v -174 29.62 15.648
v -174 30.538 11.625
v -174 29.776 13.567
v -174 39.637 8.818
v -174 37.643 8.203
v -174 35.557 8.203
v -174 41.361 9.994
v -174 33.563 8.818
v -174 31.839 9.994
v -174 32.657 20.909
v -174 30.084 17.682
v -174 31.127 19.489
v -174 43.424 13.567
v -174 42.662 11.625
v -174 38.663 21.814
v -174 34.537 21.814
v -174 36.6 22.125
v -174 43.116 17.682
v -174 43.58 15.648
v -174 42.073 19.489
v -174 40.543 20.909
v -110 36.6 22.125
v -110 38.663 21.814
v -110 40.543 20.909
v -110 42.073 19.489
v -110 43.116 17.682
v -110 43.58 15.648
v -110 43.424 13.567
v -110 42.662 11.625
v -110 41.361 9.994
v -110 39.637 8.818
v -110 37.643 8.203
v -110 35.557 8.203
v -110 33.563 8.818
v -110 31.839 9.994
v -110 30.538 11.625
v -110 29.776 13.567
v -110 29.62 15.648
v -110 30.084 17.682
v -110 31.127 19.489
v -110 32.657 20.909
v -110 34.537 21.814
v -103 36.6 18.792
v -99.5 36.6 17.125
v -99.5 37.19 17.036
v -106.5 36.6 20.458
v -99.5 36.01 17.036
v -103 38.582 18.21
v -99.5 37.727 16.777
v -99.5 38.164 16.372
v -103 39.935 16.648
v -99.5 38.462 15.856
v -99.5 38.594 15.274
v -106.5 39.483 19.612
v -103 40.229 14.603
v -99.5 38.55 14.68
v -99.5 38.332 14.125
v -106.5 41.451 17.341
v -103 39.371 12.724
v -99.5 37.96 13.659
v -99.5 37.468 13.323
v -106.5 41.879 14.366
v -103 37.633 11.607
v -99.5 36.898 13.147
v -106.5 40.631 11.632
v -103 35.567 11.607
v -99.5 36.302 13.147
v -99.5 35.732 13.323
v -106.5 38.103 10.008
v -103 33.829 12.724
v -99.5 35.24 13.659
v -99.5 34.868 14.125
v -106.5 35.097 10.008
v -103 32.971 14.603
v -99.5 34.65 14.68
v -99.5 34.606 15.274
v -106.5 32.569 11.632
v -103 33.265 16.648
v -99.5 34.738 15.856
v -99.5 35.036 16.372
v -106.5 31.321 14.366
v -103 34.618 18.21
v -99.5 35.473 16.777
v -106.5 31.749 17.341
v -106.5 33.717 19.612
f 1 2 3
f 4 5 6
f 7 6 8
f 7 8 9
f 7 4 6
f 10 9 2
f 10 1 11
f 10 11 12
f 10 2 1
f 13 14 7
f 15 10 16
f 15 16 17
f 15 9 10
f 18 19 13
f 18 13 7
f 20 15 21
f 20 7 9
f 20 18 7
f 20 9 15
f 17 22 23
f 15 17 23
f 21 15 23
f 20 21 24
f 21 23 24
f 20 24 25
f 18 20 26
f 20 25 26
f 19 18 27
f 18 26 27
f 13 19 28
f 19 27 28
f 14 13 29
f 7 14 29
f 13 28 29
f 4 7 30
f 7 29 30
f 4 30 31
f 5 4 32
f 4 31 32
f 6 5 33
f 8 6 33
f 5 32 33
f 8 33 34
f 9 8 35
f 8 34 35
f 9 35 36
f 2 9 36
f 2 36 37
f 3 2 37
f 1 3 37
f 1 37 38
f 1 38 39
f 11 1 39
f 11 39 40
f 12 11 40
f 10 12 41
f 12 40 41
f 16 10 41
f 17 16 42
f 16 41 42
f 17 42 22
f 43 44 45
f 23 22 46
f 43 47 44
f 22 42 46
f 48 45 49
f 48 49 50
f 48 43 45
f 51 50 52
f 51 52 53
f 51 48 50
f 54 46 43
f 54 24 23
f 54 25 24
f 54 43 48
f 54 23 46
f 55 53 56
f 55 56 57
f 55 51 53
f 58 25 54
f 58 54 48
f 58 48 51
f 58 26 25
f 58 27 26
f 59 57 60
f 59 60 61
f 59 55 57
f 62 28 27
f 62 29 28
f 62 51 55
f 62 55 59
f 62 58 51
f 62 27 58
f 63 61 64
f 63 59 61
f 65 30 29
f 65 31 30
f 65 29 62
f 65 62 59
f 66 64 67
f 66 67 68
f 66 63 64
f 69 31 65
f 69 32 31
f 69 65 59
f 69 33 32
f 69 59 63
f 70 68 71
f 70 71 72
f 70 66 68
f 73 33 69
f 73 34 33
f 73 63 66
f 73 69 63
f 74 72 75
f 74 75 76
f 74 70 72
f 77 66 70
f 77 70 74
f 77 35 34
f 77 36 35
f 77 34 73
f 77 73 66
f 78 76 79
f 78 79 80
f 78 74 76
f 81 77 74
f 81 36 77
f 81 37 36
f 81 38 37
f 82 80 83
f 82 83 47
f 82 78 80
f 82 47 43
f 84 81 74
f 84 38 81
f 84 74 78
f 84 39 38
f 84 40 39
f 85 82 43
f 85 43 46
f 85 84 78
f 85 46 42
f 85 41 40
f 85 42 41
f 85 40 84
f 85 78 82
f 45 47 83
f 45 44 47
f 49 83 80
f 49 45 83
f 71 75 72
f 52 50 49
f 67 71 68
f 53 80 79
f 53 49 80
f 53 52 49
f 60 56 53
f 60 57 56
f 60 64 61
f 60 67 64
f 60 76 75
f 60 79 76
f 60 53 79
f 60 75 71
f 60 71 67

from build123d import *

# Parameters (mm, degrees)
CYLINDER022_R     = 7
CYLINDER022_DEPTH = 64


with BuildPart() as syr2_head:
    # Cone001 → Cone001 (revolve)
    with BuildSketch(Plane(origin=(-99.5, 36.6, 15.125), x_dir=(0, 0, 1), z_dir=(0, -1, 0))):
        Polygon((0, 0), (2, 0), (7, 10.5), (0, 10.5), align=None)
    revolve(axis=Axis((-99.5, 36.6, 15.125), (-1, 0, 0)))


with BuildPart() as fusion012:
    # Cylinder022 → Cylinder022 (new body)
    with BuildSketch(Plane(origin=(-110, 36.6, 15.125), x_dir=(0, 0, 1), z_dir=(-1, 0, 0))):
        Circle(CYLINDER022_R)
    extrude(amount=CYLINDER022_DEPTH)

    # Fusion012: union syr2_head
    add(syr2_head.part)


solid = fusion012.part
